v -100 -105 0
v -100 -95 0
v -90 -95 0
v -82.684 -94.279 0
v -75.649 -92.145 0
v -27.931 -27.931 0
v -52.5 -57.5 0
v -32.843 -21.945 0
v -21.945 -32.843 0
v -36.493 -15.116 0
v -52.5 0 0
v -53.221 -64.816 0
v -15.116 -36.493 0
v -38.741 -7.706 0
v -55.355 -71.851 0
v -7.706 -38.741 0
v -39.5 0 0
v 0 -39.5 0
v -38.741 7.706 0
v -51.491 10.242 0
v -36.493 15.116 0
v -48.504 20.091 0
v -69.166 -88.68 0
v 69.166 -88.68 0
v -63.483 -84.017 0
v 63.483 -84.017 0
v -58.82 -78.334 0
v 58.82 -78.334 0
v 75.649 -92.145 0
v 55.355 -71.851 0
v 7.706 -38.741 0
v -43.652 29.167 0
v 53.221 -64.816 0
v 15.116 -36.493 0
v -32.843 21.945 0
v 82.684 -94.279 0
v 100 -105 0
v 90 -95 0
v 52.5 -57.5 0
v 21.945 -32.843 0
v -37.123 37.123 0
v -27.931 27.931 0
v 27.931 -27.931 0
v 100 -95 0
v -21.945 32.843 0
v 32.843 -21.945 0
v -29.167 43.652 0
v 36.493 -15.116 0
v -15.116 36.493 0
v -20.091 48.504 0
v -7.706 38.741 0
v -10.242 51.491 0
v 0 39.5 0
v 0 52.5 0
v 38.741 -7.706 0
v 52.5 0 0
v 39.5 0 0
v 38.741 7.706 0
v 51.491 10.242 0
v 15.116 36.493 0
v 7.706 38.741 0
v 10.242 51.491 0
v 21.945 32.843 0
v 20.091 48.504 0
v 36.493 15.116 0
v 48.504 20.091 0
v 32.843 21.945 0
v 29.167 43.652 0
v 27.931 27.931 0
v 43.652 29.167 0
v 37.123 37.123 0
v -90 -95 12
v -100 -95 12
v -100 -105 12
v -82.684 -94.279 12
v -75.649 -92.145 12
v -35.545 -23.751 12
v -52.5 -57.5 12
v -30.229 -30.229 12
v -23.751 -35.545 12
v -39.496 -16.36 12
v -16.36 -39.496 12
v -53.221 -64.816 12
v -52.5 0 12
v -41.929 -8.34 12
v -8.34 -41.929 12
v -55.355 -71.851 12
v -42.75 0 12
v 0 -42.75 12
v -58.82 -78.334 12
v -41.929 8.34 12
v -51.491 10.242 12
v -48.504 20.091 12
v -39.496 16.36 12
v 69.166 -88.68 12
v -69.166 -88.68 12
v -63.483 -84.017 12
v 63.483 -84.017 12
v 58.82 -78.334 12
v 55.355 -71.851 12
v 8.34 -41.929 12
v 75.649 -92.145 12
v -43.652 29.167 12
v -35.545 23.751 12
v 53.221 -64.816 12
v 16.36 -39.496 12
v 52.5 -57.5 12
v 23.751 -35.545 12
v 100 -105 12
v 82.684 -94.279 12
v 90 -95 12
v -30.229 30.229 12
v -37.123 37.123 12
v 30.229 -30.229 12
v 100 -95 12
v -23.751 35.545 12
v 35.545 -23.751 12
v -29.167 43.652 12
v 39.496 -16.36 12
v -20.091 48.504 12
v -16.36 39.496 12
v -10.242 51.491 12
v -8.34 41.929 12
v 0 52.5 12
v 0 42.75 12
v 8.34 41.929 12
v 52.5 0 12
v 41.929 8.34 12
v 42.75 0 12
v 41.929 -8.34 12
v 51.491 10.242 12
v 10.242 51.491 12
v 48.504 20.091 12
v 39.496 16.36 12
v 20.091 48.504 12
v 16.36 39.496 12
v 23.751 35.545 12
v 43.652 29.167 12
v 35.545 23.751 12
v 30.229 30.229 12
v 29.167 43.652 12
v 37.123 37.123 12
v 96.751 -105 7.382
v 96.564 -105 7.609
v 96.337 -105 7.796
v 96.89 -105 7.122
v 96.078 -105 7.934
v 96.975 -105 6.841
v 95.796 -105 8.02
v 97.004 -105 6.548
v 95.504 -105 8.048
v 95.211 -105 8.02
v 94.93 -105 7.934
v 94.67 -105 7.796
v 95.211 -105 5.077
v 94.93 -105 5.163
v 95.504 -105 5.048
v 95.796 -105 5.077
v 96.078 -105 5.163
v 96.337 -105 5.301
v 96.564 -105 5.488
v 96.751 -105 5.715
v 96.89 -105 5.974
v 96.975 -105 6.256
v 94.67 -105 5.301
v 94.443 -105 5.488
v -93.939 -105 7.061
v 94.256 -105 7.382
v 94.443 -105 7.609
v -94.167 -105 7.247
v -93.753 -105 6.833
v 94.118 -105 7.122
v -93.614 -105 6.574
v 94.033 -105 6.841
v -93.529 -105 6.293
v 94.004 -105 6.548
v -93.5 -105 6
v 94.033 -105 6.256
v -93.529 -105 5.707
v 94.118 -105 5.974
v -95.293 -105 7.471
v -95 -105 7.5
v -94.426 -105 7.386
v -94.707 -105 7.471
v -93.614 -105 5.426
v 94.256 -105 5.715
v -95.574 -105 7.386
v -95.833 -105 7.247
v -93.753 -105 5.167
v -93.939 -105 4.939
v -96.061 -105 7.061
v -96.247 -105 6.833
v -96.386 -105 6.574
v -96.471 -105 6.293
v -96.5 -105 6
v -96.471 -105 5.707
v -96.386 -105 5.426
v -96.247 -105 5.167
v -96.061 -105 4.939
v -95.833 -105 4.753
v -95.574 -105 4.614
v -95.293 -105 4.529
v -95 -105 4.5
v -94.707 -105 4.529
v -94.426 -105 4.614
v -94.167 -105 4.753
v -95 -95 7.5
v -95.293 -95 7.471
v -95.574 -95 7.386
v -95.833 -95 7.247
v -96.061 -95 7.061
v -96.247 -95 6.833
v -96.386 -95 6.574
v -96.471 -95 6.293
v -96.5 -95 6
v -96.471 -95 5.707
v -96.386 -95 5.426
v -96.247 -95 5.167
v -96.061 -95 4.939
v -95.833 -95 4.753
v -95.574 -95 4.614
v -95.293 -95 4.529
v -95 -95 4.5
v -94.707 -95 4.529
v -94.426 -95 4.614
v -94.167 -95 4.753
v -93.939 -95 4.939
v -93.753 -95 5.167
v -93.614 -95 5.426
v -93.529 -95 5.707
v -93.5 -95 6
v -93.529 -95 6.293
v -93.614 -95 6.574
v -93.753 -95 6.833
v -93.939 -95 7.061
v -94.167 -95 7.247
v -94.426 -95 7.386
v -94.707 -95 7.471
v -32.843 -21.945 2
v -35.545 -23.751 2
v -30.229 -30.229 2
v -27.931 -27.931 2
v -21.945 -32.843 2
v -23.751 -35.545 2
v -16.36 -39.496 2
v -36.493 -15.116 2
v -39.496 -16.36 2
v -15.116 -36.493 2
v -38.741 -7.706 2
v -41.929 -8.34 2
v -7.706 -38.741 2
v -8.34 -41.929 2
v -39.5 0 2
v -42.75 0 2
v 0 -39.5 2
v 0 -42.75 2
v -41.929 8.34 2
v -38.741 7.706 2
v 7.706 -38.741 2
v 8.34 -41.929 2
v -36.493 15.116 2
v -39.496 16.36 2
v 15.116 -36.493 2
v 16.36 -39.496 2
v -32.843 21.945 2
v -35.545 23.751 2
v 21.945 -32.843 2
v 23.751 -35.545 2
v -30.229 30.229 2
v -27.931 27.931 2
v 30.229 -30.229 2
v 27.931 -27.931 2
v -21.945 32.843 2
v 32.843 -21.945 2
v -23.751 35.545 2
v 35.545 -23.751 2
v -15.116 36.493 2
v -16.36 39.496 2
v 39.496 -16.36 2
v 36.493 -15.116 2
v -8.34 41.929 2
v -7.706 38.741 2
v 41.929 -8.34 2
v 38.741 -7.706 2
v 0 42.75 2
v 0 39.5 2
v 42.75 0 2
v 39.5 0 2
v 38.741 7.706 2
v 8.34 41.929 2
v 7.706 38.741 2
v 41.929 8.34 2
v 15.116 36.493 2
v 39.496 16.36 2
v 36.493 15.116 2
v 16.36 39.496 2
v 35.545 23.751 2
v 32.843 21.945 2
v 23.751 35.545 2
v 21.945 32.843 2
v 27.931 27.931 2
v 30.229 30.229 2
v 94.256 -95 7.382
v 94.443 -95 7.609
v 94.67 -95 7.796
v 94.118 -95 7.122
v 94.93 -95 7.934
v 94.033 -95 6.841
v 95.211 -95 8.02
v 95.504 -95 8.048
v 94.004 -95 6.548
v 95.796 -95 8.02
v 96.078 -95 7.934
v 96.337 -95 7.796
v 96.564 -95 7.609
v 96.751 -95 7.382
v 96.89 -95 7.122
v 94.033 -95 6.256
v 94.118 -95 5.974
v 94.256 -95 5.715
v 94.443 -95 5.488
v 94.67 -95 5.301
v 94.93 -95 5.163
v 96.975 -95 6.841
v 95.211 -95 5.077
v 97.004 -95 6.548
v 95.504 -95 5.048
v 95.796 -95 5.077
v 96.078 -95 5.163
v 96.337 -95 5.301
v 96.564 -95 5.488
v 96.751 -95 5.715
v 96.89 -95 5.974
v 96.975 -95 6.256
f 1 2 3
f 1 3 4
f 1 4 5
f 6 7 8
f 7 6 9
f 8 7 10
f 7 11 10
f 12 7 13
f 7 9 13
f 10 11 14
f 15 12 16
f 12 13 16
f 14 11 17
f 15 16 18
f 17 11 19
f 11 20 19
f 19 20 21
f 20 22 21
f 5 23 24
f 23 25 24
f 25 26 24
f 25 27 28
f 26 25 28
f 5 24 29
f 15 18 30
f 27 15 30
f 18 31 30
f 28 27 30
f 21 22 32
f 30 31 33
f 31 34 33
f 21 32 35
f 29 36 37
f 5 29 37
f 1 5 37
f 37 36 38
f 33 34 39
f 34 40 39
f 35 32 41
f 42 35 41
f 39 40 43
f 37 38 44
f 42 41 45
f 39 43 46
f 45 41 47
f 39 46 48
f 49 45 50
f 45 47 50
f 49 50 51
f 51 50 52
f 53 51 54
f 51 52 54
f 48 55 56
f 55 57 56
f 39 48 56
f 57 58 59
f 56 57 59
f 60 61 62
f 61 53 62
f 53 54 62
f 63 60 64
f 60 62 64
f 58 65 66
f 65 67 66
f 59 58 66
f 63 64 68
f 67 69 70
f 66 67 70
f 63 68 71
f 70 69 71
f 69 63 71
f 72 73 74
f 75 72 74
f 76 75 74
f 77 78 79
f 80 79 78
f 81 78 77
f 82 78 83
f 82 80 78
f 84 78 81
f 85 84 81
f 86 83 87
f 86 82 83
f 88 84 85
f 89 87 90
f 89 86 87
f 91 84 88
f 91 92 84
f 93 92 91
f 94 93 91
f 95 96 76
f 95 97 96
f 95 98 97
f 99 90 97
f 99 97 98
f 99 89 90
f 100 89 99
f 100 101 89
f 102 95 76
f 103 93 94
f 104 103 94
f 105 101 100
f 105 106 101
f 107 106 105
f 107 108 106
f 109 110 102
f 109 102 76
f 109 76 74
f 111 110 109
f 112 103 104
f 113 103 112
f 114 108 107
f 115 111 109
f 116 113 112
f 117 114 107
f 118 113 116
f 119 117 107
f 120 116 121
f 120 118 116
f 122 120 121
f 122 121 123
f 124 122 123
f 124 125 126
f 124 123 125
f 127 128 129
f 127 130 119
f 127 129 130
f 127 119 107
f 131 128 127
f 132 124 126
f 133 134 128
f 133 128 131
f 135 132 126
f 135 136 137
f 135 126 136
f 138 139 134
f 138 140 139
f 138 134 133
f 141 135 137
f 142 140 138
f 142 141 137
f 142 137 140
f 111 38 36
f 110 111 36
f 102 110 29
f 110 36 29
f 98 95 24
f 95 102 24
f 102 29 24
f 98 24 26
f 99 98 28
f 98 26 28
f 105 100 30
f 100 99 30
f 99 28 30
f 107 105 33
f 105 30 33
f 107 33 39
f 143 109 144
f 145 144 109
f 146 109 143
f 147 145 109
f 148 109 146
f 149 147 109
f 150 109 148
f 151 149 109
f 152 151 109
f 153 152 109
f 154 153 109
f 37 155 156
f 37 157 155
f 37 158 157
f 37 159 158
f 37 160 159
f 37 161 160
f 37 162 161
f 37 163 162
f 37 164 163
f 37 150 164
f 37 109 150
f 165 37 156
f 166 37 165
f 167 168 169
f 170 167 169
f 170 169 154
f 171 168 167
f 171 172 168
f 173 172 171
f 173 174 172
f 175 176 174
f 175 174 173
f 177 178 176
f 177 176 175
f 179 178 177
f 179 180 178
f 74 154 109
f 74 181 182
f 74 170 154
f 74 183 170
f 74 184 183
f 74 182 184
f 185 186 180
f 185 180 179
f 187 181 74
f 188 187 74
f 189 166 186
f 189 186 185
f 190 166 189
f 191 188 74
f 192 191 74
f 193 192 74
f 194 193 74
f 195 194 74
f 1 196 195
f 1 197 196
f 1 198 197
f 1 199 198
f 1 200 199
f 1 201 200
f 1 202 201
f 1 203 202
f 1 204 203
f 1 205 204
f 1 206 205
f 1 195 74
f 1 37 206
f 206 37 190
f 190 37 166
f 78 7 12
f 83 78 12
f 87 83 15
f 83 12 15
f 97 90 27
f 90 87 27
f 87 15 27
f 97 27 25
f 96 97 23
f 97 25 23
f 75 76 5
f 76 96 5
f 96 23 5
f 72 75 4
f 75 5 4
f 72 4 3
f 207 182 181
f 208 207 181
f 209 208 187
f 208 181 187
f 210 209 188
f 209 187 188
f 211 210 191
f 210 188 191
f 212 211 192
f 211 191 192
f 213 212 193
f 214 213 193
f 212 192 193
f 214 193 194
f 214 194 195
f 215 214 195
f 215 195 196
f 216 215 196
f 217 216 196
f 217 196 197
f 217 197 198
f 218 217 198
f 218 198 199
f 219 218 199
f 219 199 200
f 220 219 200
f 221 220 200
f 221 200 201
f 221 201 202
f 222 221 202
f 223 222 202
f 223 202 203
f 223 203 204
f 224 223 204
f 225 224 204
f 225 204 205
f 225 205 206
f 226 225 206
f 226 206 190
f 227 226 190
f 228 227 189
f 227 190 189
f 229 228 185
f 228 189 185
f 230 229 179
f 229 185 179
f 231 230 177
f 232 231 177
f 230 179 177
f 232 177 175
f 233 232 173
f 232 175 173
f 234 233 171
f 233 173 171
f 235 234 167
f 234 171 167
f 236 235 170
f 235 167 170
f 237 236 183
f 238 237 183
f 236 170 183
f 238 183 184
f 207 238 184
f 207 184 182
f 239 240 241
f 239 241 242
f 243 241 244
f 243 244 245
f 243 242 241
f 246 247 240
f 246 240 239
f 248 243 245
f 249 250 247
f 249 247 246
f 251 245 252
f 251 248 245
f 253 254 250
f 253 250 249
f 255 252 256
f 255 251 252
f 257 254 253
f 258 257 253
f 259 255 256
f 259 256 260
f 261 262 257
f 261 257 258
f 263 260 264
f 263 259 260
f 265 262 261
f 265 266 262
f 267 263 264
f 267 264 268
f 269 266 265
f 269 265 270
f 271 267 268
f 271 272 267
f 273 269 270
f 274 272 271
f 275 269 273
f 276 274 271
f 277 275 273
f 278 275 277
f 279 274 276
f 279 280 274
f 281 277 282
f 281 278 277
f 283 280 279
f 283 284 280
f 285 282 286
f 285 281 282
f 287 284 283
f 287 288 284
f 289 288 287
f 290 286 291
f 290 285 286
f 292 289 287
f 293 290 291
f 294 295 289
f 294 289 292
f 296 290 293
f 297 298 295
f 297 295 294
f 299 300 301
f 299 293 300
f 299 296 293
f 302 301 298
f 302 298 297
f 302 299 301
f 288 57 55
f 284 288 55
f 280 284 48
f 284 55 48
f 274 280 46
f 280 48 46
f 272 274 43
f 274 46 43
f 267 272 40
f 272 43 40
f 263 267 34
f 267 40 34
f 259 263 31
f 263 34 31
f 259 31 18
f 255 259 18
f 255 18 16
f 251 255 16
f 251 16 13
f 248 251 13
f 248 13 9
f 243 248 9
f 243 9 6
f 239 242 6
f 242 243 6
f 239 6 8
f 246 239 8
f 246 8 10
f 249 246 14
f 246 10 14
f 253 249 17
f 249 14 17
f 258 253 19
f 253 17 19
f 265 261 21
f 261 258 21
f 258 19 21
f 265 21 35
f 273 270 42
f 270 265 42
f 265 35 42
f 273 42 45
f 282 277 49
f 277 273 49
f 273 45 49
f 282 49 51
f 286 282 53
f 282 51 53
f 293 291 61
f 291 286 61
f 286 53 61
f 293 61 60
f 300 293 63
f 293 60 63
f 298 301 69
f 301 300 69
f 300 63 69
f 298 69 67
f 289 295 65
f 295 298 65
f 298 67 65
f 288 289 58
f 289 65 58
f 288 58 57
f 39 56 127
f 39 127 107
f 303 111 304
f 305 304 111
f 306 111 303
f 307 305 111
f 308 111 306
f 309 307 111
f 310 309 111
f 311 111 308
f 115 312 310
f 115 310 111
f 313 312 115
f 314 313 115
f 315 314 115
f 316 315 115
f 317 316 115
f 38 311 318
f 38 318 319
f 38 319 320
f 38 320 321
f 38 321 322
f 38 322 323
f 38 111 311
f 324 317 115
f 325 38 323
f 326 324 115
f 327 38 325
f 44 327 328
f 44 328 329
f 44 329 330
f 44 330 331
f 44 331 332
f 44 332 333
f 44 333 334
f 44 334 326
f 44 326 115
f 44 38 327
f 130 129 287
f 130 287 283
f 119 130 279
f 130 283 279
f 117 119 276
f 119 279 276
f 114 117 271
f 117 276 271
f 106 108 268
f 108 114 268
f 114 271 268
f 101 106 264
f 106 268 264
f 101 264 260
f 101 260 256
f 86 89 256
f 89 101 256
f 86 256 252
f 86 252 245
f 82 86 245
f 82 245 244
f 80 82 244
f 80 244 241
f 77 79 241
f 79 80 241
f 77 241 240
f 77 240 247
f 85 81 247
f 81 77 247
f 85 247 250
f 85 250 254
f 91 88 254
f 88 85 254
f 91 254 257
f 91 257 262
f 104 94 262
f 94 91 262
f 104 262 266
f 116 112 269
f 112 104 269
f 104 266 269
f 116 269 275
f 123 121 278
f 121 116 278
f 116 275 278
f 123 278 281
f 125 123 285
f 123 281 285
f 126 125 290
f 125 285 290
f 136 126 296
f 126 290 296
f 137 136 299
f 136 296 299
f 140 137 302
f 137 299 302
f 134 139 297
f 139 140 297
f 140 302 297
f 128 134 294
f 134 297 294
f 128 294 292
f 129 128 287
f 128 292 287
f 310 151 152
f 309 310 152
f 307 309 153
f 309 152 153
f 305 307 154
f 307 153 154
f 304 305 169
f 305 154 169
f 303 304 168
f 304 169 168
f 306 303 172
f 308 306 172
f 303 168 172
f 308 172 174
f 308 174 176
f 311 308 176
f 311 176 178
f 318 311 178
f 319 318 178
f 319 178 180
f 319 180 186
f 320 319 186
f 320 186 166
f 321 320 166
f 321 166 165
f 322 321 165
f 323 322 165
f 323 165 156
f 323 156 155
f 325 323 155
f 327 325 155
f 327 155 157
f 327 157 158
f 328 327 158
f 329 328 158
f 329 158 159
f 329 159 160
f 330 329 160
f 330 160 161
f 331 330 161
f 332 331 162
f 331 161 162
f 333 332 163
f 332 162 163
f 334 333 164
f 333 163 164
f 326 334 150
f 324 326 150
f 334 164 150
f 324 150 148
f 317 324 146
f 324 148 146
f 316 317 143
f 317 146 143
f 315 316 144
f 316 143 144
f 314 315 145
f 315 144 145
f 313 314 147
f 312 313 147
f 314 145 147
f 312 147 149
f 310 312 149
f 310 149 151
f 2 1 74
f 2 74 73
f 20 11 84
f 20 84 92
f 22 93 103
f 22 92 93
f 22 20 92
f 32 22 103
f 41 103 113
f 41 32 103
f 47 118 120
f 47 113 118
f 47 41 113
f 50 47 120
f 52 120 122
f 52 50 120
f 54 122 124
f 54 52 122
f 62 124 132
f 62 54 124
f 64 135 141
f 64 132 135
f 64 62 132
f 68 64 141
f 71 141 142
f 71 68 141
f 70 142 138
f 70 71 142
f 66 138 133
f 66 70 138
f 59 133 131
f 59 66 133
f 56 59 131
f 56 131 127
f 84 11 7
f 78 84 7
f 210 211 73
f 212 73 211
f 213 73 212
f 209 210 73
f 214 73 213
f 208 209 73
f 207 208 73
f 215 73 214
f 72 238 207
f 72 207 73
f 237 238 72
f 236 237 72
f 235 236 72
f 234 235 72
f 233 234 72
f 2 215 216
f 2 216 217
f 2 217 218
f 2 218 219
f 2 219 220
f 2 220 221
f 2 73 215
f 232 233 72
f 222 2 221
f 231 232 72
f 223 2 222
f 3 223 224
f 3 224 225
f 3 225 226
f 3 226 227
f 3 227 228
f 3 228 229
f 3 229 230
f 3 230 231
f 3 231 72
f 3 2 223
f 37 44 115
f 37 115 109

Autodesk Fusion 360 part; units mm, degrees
sketch "Sketch1" plane through (0, 0, 0) normal (0, 0, 1) x (1, 0, 0)
  circle A0 centre (0, 0) radius 42.75
  circle A1 centre (0, 0) radius 39.5
  line L0 (0, 0) -> (0, -100) construction
  line L1 (100, -105) -> (-100, -105)
  line L2 (-100, -105) -> (-100, -95)
  line L3 (100, -95) -> (100, -105)
  line L4 (100, -105) -> (-100, -95) construction
  line L5 (-100, -105) -> (100, -95) construction
  circle A2 centre (0, 0) radius 52.5
  line L6 (-52.5, 0) -> (-52.5, -57.5)
  line L7 (52.5, 0) -> (52.5, -57.5)
  line L8 (-100, -95) -> (-90, -95)
  line L9 (90, -95) -> (100, -95)
  arc A3 (-90, -95) -> (-52.5, -57.5) centre (-90, -57.5) ccw
  arc A4 (52.5, -57.5) -> (90, -95) centre (90, -57.5) ccw
  point P0 (0, -100)
  dimension "d1" = 85.5
  dimension "d5" = 79
  dimension "d7" = 100
  dimension "d8" = 200
  dimension "d9" = 10
  dimension "d10" = 105
  dimension "d11" = 37.5
  dimension "d12" = 10
  dimension "d13" = 37.5
extrude "Extrude1" add sketch "Sketch1" along normal blind 12 contours L1 L2 L3 A2 L6 L7 L8 L9 A3 A4 | A2
extrude "Extrude2" add sketch "Sketch1" along normal blind 2 contours A0
hole "Hole1" at (-95, -95, 6) direction (0, -1, 0) diameter 3 depth 10 tip angle 118
hole "Hole2" at (95.5037, -95, 6.5484) direction (0, -1, 0) diameter 3 depth 10 tip angle 118
equation "d1 = BearingDia + Tollerance"
equation "BearingDia = 85 mm"
equation "BearingOffset = 79 mm"
equation "Tollerance = 0.5 mm"
equation "d5 = BearingOffset"
equation "AxleHeight = 105 mm"
equation "d7 = AxleHeight - 5 mm"
equation "d10 = BearingDia + 20 mm"
